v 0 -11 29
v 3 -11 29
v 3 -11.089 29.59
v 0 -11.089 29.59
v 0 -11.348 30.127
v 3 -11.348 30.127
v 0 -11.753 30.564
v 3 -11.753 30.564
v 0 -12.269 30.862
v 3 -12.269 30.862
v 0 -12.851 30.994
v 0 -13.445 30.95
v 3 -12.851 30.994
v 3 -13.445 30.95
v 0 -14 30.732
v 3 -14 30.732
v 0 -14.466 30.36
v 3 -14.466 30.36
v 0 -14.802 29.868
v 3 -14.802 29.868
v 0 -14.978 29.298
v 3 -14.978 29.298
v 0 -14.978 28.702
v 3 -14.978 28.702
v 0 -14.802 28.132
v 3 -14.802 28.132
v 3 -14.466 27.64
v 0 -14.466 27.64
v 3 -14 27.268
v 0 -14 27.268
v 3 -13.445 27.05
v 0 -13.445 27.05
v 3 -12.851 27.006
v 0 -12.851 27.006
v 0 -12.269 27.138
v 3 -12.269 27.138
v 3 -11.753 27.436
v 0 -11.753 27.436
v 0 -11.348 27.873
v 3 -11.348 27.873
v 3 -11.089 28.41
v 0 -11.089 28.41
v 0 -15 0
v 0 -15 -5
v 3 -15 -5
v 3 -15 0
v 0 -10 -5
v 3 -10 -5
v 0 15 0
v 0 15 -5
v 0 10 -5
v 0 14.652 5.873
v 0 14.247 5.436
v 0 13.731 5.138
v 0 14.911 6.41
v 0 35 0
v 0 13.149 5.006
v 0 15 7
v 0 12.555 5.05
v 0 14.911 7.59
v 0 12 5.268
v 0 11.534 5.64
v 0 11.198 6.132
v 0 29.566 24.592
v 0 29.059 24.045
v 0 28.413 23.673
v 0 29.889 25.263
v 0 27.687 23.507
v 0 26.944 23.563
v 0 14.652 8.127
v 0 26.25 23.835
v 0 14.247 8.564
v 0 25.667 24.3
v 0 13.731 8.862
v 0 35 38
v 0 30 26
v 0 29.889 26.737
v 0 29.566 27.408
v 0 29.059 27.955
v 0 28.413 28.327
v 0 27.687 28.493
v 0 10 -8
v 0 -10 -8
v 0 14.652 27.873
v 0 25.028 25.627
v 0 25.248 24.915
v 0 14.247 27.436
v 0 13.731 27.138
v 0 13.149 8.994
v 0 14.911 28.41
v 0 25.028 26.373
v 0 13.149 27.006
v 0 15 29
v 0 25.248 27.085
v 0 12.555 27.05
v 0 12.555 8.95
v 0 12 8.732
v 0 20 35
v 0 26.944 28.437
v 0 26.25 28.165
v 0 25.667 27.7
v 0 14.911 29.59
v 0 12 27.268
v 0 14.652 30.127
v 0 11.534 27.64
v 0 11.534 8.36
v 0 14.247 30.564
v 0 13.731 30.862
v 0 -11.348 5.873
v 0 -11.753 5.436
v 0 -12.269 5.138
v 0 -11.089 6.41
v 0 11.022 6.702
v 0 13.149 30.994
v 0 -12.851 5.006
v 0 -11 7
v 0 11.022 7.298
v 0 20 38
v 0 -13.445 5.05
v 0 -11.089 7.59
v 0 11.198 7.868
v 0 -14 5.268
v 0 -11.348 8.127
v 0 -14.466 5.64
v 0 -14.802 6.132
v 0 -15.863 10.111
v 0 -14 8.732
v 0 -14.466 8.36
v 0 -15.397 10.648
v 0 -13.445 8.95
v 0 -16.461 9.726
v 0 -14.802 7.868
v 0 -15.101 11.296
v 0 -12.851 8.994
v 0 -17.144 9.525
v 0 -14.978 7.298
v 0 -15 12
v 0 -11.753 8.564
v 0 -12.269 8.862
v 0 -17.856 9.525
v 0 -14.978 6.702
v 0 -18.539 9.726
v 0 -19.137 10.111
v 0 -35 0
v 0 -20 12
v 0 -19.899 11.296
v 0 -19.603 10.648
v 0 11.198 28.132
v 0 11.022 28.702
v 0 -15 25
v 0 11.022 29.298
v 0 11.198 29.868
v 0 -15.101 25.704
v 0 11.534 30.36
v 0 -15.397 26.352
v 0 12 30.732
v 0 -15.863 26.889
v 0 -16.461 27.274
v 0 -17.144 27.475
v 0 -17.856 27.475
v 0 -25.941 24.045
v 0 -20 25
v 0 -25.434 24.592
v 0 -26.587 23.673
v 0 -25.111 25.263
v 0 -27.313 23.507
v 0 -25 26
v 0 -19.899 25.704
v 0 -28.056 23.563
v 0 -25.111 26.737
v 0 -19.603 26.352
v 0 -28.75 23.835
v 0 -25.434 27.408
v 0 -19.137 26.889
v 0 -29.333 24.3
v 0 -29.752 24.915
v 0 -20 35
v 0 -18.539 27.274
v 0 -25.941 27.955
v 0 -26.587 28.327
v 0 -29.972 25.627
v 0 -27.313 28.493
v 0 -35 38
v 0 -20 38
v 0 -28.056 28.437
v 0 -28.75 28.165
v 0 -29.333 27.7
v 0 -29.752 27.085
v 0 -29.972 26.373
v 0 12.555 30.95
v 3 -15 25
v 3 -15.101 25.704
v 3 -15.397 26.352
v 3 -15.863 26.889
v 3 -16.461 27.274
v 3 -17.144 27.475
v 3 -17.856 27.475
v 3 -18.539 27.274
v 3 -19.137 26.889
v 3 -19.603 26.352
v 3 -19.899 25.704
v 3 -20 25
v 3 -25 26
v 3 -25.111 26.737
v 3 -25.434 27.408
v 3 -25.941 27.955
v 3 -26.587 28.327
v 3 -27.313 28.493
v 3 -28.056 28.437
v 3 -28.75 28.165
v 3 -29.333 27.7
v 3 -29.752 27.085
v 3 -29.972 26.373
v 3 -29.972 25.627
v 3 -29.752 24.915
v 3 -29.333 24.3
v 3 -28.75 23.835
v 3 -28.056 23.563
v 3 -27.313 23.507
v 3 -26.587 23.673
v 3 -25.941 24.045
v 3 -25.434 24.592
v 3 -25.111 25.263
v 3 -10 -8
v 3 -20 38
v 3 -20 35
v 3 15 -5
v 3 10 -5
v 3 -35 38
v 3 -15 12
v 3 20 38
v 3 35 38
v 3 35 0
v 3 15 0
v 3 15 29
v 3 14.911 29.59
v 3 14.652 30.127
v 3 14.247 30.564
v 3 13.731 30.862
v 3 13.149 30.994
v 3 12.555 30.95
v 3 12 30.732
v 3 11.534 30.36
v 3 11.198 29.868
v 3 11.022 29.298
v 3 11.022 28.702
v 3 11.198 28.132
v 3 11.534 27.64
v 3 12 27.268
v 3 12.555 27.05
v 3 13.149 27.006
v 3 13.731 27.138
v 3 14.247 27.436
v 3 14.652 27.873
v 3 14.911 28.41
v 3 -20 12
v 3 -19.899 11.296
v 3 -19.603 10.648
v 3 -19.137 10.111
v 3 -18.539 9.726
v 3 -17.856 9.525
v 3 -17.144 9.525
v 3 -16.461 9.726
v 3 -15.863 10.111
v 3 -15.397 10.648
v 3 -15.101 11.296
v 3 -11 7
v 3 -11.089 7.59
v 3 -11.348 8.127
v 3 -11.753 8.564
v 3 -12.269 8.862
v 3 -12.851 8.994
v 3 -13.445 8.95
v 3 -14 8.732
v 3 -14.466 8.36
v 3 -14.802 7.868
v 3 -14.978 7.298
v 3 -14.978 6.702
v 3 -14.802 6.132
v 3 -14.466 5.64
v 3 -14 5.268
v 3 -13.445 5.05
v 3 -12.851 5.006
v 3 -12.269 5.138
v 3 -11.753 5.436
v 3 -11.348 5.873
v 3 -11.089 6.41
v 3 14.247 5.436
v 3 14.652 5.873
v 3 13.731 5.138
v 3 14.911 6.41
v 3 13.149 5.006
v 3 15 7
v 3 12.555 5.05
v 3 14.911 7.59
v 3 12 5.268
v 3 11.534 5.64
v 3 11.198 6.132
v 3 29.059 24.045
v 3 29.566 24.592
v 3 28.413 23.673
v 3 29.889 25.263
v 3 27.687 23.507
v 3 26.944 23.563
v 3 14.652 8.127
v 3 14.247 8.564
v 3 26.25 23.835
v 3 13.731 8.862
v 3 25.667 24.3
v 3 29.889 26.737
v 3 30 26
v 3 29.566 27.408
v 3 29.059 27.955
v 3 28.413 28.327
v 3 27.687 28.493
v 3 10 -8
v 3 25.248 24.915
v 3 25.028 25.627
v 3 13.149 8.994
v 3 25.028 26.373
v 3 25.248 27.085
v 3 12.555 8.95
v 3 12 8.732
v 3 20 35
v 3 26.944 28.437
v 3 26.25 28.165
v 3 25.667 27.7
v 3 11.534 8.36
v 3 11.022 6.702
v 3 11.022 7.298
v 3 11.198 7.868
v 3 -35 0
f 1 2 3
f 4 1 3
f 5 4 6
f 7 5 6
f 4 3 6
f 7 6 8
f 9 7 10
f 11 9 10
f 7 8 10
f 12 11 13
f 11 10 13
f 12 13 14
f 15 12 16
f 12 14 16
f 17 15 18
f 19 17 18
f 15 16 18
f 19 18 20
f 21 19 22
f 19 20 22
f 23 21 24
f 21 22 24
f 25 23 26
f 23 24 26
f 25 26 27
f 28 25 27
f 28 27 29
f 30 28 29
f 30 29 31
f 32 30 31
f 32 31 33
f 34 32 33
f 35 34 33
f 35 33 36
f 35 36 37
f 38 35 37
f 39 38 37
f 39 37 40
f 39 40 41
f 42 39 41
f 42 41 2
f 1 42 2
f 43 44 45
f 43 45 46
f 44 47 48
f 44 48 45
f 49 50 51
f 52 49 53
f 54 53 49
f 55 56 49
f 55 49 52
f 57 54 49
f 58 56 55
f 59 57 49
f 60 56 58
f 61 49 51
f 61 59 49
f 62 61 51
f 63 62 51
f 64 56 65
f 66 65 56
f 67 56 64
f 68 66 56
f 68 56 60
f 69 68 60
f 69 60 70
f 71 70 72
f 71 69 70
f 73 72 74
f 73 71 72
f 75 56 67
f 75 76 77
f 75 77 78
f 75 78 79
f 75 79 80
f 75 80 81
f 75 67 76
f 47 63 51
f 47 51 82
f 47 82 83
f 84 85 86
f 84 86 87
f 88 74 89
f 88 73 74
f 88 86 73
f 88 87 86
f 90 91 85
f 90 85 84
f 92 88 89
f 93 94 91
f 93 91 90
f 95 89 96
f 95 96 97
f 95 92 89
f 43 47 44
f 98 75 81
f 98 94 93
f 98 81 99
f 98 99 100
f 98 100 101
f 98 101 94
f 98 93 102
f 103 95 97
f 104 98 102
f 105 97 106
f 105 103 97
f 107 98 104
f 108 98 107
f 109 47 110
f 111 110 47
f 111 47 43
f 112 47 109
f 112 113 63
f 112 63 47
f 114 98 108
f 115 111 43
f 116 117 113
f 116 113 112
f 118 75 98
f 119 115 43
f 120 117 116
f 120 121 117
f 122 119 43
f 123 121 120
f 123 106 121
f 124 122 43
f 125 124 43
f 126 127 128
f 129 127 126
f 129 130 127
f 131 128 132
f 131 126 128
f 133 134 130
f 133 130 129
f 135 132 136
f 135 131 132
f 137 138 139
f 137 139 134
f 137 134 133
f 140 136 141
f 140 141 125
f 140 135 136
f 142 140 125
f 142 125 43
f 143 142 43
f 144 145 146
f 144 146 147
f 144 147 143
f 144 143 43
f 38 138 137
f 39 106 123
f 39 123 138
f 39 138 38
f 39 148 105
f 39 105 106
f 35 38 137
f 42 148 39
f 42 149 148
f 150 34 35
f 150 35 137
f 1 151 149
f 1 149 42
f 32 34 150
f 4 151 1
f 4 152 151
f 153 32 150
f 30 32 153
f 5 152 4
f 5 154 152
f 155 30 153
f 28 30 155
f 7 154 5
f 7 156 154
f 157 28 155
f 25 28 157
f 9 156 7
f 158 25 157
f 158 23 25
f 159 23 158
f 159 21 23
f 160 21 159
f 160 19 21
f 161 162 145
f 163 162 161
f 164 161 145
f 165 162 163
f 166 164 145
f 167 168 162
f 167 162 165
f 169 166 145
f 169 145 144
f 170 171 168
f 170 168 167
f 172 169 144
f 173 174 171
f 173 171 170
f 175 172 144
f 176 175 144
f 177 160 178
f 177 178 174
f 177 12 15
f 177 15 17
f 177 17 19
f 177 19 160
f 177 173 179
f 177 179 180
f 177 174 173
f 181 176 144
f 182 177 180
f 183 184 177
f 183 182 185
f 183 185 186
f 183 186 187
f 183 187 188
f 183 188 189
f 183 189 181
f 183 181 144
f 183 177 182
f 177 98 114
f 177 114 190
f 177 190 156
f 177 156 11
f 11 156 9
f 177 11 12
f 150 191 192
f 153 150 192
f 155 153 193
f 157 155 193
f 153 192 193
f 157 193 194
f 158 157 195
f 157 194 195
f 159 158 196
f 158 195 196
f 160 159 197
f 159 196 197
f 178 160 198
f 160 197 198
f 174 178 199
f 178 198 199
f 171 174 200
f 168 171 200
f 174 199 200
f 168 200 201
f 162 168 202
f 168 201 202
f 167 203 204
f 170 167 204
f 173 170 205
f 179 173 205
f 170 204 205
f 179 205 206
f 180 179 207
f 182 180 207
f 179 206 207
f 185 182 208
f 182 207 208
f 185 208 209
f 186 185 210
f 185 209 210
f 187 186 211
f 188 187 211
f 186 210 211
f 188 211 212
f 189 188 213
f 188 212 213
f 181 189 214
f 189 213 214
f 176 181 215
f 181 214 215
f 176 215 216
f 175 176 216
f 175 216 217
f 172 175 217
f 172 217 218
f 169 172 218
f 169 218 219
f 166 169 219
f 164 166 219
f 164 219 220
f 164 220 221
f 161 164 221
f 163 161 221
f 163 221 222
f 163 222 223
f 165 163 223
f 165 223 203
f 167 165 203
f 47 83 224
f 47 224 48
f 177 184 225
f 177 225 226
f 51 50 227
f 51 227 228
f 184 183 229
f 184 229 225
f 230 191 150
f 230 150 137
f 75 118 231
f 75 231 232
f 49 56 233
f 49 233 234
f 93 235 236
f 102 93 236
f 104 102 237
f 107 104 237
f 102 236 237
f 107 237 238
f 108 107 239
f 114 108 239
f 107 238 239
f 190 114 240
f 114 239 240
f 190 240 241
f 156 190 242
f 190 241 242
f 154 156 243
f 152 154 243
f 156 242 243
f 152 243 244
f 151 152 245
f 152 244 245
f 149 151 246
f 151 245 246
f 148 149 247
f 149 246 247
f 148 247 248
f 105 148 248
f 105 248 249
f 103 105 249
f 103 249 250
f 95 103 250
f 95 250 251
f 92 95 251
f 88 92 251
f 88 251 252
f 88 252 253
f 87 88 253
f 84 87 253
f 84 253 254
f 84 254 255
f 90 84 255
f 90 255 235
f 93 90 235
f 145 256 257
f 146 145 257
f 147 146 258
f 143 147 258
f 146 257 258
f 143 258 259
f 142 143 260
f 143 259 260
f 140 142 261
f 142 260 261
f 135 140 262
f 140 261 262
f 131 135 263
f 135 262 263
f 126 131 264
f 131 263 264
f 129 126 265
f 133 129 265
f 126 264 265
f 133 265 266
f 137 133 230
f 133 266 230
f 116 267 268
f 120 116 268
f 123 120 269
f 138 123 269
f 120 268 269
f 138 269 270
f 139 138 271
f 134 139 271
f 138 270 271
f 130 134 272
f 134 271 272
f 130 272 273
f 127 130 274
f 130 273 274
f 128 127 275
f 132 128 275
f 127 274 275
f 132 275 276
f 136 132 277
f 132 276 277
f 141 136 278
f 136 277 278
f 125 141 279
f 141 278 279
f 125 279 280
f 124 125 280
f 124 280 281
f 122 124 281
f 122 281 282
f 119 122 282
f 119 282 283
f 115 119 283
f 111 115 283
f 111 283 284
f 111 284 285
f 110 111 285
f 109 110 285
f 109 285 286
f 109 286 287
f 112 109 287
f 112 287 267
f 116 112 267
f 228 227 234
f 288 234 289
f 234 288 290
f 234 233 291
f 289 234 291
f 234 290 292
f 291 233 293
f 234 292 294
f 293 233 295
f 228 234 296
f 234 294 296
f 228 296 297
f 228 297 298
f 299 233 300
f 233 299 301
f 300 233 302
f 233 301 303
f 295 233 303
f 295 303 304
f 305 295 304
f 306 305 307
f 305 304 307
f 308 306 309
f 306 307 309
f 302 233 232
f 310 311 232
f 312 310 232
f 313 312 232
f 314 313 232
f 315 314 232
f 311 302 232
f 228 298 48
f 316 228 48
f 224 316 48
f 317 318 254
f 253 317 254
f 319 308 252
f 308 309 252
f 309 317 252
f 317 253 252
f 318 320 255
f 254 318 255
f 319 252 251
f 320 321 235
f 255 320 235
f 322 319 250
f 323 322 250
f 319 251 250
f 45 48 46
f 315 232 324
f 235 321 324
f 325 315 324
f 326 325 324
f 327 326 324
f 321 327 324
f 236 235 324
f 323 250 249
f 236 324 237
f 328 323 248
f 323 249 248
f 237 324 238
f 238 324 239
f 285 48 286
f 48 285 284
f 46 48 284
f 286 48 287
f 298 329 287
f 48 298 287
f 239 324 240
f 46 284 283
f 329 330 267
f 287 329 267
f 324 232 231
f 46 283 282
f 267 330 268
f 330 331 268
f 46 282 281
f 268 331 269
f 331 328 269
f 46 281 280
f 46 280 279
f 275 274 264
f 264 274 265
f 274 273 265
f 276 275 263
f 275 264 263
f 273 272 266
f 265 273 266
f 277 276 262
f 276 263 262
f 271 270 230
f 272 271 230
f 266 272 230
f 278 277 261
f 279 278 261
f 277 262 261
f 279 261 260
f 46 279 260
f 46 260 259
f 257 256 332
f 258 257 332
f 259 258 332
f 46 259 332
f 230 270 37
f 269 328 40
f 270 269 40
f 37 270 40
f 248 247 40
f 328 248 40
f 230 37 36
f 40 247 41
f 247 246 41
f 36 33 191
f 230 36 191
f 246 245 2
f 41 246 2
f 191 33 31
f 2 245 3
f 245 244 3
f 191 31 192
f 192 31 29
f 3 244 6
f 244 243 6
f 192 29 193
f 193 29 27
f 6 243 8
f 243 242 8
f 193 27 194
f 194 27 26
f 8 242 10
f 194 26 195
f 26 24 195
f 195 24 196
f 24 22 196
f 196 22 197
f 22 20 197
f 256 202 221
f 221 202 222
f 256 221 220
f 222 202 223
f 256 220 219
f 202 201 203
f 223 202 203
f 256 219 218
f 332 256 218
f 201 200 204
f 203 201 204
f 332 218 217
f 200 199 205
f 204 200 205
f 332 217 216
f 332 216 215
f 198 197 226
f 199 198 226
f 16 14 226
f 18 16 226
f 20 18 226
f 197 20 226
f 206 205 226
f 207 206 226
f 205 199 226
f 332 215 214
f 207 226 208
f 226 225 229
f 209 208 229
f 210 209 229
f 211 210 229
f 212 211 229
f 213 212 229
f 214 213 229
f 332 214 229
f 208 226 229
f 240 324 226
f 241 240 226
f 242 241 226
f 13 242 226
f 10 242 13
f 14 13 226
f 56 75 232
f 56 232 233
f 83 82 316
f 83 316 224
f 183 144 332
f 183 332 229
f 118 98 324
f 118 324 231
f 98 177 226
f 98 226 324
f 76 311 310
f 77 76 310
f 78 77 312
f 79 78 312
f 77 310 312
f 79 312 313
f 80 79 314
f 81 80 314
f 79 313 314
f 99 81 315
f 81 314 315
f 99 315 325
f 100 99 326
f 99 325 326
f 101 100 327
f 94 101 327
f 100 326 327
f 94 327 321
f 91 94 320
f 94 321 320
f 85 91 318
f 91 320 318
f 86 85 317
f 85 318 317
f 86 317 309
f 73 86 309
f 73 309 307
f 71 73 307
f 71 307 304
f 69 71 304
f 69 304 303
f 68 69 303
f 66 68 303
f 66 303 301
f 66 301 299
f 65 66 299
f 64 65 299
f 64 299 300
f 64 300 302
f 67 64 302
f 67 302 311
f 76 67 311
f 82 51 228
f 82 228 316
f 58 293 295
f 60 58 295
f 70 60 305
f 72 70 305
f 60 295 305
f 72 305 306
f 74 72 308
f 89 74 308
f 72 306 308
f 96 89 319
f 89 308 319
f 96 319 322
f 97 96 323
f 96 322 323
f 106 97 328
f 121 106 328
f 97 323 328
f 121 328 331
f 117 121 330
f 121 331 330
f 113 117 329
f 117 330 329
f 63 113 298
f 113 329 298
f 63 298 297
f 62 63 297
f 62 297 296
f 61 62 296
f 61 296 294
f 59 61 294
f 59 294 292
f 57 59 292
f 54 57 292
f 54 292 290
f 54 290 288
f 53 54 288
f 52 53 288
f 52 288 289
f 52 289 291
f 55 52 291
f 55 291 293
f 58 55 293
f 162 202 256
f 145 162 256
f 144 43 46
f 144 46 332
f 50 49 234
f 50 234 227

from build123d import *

# Parameters (mm, degrees)
PAD001_DEPTH    = 3
SKETCH010_R     = 2
POCKET007_DEPTH = 3.001
SKETCH011_R     = 2.5
POCKET008_DEPTH = 3.001


with BuildPart() as part:
    # Sketch004 → Pad001 (new body)
    with BuildSketch(Plane.YZ):
        Polygon((-35, 38), (-20, 38), (-20, 35), (20, 35), (20, 38), (35, 38), (35, 0), (15, 0), (15, -5), (10, -5), (10, -8), (-10, -8), (-10, -5), (-15, -5), (-15, 0), (-35, 0), align=None)
    extrude(amount=PAD001_DEPTH)

    # Sketch010 → Pocket007 (cut, through all)
    with BuildSketch(Plane.YZ.offset(3)):
        with Locations((-13, 29)):
            Circle(SKETCH010_R)
        with Locations((13, 29)):
            Circle(SKETCH010_R)
        with Locations((-13, 7)):
            Circle(SKETCH010_R)
        with Locations((13, 7)):
            Circle(SKETCH010_R)
        with BuildLine():
            Line((-20, 25), (-20, 12))
            ThreePointArc((-20, 12), (-17.5, 9.5), (-15, 12))
            Line((-15, 25), (-15, 12))
            ThreePointArc((-15, 25), (-17.5, 27.5), (-20, 25))
        make_face()
    extrude(amount=-POCKET007_DEPTH, mode=Mode.SUBTRACT)

    # Sketch011 → Pocket008 (cut, through all)
    with BuildSketch(Plane.YZ.offset(3)):
        with Locations((-27.5, 26)):
            Circle(SKETCH011_R)
        with Locations((27.5, 26)):
            Circle(SKETCH011_R)
    extrude(amount=-POCKET008_DEPTH, mode=Mode.SUBTRACT)


solid = part.part
